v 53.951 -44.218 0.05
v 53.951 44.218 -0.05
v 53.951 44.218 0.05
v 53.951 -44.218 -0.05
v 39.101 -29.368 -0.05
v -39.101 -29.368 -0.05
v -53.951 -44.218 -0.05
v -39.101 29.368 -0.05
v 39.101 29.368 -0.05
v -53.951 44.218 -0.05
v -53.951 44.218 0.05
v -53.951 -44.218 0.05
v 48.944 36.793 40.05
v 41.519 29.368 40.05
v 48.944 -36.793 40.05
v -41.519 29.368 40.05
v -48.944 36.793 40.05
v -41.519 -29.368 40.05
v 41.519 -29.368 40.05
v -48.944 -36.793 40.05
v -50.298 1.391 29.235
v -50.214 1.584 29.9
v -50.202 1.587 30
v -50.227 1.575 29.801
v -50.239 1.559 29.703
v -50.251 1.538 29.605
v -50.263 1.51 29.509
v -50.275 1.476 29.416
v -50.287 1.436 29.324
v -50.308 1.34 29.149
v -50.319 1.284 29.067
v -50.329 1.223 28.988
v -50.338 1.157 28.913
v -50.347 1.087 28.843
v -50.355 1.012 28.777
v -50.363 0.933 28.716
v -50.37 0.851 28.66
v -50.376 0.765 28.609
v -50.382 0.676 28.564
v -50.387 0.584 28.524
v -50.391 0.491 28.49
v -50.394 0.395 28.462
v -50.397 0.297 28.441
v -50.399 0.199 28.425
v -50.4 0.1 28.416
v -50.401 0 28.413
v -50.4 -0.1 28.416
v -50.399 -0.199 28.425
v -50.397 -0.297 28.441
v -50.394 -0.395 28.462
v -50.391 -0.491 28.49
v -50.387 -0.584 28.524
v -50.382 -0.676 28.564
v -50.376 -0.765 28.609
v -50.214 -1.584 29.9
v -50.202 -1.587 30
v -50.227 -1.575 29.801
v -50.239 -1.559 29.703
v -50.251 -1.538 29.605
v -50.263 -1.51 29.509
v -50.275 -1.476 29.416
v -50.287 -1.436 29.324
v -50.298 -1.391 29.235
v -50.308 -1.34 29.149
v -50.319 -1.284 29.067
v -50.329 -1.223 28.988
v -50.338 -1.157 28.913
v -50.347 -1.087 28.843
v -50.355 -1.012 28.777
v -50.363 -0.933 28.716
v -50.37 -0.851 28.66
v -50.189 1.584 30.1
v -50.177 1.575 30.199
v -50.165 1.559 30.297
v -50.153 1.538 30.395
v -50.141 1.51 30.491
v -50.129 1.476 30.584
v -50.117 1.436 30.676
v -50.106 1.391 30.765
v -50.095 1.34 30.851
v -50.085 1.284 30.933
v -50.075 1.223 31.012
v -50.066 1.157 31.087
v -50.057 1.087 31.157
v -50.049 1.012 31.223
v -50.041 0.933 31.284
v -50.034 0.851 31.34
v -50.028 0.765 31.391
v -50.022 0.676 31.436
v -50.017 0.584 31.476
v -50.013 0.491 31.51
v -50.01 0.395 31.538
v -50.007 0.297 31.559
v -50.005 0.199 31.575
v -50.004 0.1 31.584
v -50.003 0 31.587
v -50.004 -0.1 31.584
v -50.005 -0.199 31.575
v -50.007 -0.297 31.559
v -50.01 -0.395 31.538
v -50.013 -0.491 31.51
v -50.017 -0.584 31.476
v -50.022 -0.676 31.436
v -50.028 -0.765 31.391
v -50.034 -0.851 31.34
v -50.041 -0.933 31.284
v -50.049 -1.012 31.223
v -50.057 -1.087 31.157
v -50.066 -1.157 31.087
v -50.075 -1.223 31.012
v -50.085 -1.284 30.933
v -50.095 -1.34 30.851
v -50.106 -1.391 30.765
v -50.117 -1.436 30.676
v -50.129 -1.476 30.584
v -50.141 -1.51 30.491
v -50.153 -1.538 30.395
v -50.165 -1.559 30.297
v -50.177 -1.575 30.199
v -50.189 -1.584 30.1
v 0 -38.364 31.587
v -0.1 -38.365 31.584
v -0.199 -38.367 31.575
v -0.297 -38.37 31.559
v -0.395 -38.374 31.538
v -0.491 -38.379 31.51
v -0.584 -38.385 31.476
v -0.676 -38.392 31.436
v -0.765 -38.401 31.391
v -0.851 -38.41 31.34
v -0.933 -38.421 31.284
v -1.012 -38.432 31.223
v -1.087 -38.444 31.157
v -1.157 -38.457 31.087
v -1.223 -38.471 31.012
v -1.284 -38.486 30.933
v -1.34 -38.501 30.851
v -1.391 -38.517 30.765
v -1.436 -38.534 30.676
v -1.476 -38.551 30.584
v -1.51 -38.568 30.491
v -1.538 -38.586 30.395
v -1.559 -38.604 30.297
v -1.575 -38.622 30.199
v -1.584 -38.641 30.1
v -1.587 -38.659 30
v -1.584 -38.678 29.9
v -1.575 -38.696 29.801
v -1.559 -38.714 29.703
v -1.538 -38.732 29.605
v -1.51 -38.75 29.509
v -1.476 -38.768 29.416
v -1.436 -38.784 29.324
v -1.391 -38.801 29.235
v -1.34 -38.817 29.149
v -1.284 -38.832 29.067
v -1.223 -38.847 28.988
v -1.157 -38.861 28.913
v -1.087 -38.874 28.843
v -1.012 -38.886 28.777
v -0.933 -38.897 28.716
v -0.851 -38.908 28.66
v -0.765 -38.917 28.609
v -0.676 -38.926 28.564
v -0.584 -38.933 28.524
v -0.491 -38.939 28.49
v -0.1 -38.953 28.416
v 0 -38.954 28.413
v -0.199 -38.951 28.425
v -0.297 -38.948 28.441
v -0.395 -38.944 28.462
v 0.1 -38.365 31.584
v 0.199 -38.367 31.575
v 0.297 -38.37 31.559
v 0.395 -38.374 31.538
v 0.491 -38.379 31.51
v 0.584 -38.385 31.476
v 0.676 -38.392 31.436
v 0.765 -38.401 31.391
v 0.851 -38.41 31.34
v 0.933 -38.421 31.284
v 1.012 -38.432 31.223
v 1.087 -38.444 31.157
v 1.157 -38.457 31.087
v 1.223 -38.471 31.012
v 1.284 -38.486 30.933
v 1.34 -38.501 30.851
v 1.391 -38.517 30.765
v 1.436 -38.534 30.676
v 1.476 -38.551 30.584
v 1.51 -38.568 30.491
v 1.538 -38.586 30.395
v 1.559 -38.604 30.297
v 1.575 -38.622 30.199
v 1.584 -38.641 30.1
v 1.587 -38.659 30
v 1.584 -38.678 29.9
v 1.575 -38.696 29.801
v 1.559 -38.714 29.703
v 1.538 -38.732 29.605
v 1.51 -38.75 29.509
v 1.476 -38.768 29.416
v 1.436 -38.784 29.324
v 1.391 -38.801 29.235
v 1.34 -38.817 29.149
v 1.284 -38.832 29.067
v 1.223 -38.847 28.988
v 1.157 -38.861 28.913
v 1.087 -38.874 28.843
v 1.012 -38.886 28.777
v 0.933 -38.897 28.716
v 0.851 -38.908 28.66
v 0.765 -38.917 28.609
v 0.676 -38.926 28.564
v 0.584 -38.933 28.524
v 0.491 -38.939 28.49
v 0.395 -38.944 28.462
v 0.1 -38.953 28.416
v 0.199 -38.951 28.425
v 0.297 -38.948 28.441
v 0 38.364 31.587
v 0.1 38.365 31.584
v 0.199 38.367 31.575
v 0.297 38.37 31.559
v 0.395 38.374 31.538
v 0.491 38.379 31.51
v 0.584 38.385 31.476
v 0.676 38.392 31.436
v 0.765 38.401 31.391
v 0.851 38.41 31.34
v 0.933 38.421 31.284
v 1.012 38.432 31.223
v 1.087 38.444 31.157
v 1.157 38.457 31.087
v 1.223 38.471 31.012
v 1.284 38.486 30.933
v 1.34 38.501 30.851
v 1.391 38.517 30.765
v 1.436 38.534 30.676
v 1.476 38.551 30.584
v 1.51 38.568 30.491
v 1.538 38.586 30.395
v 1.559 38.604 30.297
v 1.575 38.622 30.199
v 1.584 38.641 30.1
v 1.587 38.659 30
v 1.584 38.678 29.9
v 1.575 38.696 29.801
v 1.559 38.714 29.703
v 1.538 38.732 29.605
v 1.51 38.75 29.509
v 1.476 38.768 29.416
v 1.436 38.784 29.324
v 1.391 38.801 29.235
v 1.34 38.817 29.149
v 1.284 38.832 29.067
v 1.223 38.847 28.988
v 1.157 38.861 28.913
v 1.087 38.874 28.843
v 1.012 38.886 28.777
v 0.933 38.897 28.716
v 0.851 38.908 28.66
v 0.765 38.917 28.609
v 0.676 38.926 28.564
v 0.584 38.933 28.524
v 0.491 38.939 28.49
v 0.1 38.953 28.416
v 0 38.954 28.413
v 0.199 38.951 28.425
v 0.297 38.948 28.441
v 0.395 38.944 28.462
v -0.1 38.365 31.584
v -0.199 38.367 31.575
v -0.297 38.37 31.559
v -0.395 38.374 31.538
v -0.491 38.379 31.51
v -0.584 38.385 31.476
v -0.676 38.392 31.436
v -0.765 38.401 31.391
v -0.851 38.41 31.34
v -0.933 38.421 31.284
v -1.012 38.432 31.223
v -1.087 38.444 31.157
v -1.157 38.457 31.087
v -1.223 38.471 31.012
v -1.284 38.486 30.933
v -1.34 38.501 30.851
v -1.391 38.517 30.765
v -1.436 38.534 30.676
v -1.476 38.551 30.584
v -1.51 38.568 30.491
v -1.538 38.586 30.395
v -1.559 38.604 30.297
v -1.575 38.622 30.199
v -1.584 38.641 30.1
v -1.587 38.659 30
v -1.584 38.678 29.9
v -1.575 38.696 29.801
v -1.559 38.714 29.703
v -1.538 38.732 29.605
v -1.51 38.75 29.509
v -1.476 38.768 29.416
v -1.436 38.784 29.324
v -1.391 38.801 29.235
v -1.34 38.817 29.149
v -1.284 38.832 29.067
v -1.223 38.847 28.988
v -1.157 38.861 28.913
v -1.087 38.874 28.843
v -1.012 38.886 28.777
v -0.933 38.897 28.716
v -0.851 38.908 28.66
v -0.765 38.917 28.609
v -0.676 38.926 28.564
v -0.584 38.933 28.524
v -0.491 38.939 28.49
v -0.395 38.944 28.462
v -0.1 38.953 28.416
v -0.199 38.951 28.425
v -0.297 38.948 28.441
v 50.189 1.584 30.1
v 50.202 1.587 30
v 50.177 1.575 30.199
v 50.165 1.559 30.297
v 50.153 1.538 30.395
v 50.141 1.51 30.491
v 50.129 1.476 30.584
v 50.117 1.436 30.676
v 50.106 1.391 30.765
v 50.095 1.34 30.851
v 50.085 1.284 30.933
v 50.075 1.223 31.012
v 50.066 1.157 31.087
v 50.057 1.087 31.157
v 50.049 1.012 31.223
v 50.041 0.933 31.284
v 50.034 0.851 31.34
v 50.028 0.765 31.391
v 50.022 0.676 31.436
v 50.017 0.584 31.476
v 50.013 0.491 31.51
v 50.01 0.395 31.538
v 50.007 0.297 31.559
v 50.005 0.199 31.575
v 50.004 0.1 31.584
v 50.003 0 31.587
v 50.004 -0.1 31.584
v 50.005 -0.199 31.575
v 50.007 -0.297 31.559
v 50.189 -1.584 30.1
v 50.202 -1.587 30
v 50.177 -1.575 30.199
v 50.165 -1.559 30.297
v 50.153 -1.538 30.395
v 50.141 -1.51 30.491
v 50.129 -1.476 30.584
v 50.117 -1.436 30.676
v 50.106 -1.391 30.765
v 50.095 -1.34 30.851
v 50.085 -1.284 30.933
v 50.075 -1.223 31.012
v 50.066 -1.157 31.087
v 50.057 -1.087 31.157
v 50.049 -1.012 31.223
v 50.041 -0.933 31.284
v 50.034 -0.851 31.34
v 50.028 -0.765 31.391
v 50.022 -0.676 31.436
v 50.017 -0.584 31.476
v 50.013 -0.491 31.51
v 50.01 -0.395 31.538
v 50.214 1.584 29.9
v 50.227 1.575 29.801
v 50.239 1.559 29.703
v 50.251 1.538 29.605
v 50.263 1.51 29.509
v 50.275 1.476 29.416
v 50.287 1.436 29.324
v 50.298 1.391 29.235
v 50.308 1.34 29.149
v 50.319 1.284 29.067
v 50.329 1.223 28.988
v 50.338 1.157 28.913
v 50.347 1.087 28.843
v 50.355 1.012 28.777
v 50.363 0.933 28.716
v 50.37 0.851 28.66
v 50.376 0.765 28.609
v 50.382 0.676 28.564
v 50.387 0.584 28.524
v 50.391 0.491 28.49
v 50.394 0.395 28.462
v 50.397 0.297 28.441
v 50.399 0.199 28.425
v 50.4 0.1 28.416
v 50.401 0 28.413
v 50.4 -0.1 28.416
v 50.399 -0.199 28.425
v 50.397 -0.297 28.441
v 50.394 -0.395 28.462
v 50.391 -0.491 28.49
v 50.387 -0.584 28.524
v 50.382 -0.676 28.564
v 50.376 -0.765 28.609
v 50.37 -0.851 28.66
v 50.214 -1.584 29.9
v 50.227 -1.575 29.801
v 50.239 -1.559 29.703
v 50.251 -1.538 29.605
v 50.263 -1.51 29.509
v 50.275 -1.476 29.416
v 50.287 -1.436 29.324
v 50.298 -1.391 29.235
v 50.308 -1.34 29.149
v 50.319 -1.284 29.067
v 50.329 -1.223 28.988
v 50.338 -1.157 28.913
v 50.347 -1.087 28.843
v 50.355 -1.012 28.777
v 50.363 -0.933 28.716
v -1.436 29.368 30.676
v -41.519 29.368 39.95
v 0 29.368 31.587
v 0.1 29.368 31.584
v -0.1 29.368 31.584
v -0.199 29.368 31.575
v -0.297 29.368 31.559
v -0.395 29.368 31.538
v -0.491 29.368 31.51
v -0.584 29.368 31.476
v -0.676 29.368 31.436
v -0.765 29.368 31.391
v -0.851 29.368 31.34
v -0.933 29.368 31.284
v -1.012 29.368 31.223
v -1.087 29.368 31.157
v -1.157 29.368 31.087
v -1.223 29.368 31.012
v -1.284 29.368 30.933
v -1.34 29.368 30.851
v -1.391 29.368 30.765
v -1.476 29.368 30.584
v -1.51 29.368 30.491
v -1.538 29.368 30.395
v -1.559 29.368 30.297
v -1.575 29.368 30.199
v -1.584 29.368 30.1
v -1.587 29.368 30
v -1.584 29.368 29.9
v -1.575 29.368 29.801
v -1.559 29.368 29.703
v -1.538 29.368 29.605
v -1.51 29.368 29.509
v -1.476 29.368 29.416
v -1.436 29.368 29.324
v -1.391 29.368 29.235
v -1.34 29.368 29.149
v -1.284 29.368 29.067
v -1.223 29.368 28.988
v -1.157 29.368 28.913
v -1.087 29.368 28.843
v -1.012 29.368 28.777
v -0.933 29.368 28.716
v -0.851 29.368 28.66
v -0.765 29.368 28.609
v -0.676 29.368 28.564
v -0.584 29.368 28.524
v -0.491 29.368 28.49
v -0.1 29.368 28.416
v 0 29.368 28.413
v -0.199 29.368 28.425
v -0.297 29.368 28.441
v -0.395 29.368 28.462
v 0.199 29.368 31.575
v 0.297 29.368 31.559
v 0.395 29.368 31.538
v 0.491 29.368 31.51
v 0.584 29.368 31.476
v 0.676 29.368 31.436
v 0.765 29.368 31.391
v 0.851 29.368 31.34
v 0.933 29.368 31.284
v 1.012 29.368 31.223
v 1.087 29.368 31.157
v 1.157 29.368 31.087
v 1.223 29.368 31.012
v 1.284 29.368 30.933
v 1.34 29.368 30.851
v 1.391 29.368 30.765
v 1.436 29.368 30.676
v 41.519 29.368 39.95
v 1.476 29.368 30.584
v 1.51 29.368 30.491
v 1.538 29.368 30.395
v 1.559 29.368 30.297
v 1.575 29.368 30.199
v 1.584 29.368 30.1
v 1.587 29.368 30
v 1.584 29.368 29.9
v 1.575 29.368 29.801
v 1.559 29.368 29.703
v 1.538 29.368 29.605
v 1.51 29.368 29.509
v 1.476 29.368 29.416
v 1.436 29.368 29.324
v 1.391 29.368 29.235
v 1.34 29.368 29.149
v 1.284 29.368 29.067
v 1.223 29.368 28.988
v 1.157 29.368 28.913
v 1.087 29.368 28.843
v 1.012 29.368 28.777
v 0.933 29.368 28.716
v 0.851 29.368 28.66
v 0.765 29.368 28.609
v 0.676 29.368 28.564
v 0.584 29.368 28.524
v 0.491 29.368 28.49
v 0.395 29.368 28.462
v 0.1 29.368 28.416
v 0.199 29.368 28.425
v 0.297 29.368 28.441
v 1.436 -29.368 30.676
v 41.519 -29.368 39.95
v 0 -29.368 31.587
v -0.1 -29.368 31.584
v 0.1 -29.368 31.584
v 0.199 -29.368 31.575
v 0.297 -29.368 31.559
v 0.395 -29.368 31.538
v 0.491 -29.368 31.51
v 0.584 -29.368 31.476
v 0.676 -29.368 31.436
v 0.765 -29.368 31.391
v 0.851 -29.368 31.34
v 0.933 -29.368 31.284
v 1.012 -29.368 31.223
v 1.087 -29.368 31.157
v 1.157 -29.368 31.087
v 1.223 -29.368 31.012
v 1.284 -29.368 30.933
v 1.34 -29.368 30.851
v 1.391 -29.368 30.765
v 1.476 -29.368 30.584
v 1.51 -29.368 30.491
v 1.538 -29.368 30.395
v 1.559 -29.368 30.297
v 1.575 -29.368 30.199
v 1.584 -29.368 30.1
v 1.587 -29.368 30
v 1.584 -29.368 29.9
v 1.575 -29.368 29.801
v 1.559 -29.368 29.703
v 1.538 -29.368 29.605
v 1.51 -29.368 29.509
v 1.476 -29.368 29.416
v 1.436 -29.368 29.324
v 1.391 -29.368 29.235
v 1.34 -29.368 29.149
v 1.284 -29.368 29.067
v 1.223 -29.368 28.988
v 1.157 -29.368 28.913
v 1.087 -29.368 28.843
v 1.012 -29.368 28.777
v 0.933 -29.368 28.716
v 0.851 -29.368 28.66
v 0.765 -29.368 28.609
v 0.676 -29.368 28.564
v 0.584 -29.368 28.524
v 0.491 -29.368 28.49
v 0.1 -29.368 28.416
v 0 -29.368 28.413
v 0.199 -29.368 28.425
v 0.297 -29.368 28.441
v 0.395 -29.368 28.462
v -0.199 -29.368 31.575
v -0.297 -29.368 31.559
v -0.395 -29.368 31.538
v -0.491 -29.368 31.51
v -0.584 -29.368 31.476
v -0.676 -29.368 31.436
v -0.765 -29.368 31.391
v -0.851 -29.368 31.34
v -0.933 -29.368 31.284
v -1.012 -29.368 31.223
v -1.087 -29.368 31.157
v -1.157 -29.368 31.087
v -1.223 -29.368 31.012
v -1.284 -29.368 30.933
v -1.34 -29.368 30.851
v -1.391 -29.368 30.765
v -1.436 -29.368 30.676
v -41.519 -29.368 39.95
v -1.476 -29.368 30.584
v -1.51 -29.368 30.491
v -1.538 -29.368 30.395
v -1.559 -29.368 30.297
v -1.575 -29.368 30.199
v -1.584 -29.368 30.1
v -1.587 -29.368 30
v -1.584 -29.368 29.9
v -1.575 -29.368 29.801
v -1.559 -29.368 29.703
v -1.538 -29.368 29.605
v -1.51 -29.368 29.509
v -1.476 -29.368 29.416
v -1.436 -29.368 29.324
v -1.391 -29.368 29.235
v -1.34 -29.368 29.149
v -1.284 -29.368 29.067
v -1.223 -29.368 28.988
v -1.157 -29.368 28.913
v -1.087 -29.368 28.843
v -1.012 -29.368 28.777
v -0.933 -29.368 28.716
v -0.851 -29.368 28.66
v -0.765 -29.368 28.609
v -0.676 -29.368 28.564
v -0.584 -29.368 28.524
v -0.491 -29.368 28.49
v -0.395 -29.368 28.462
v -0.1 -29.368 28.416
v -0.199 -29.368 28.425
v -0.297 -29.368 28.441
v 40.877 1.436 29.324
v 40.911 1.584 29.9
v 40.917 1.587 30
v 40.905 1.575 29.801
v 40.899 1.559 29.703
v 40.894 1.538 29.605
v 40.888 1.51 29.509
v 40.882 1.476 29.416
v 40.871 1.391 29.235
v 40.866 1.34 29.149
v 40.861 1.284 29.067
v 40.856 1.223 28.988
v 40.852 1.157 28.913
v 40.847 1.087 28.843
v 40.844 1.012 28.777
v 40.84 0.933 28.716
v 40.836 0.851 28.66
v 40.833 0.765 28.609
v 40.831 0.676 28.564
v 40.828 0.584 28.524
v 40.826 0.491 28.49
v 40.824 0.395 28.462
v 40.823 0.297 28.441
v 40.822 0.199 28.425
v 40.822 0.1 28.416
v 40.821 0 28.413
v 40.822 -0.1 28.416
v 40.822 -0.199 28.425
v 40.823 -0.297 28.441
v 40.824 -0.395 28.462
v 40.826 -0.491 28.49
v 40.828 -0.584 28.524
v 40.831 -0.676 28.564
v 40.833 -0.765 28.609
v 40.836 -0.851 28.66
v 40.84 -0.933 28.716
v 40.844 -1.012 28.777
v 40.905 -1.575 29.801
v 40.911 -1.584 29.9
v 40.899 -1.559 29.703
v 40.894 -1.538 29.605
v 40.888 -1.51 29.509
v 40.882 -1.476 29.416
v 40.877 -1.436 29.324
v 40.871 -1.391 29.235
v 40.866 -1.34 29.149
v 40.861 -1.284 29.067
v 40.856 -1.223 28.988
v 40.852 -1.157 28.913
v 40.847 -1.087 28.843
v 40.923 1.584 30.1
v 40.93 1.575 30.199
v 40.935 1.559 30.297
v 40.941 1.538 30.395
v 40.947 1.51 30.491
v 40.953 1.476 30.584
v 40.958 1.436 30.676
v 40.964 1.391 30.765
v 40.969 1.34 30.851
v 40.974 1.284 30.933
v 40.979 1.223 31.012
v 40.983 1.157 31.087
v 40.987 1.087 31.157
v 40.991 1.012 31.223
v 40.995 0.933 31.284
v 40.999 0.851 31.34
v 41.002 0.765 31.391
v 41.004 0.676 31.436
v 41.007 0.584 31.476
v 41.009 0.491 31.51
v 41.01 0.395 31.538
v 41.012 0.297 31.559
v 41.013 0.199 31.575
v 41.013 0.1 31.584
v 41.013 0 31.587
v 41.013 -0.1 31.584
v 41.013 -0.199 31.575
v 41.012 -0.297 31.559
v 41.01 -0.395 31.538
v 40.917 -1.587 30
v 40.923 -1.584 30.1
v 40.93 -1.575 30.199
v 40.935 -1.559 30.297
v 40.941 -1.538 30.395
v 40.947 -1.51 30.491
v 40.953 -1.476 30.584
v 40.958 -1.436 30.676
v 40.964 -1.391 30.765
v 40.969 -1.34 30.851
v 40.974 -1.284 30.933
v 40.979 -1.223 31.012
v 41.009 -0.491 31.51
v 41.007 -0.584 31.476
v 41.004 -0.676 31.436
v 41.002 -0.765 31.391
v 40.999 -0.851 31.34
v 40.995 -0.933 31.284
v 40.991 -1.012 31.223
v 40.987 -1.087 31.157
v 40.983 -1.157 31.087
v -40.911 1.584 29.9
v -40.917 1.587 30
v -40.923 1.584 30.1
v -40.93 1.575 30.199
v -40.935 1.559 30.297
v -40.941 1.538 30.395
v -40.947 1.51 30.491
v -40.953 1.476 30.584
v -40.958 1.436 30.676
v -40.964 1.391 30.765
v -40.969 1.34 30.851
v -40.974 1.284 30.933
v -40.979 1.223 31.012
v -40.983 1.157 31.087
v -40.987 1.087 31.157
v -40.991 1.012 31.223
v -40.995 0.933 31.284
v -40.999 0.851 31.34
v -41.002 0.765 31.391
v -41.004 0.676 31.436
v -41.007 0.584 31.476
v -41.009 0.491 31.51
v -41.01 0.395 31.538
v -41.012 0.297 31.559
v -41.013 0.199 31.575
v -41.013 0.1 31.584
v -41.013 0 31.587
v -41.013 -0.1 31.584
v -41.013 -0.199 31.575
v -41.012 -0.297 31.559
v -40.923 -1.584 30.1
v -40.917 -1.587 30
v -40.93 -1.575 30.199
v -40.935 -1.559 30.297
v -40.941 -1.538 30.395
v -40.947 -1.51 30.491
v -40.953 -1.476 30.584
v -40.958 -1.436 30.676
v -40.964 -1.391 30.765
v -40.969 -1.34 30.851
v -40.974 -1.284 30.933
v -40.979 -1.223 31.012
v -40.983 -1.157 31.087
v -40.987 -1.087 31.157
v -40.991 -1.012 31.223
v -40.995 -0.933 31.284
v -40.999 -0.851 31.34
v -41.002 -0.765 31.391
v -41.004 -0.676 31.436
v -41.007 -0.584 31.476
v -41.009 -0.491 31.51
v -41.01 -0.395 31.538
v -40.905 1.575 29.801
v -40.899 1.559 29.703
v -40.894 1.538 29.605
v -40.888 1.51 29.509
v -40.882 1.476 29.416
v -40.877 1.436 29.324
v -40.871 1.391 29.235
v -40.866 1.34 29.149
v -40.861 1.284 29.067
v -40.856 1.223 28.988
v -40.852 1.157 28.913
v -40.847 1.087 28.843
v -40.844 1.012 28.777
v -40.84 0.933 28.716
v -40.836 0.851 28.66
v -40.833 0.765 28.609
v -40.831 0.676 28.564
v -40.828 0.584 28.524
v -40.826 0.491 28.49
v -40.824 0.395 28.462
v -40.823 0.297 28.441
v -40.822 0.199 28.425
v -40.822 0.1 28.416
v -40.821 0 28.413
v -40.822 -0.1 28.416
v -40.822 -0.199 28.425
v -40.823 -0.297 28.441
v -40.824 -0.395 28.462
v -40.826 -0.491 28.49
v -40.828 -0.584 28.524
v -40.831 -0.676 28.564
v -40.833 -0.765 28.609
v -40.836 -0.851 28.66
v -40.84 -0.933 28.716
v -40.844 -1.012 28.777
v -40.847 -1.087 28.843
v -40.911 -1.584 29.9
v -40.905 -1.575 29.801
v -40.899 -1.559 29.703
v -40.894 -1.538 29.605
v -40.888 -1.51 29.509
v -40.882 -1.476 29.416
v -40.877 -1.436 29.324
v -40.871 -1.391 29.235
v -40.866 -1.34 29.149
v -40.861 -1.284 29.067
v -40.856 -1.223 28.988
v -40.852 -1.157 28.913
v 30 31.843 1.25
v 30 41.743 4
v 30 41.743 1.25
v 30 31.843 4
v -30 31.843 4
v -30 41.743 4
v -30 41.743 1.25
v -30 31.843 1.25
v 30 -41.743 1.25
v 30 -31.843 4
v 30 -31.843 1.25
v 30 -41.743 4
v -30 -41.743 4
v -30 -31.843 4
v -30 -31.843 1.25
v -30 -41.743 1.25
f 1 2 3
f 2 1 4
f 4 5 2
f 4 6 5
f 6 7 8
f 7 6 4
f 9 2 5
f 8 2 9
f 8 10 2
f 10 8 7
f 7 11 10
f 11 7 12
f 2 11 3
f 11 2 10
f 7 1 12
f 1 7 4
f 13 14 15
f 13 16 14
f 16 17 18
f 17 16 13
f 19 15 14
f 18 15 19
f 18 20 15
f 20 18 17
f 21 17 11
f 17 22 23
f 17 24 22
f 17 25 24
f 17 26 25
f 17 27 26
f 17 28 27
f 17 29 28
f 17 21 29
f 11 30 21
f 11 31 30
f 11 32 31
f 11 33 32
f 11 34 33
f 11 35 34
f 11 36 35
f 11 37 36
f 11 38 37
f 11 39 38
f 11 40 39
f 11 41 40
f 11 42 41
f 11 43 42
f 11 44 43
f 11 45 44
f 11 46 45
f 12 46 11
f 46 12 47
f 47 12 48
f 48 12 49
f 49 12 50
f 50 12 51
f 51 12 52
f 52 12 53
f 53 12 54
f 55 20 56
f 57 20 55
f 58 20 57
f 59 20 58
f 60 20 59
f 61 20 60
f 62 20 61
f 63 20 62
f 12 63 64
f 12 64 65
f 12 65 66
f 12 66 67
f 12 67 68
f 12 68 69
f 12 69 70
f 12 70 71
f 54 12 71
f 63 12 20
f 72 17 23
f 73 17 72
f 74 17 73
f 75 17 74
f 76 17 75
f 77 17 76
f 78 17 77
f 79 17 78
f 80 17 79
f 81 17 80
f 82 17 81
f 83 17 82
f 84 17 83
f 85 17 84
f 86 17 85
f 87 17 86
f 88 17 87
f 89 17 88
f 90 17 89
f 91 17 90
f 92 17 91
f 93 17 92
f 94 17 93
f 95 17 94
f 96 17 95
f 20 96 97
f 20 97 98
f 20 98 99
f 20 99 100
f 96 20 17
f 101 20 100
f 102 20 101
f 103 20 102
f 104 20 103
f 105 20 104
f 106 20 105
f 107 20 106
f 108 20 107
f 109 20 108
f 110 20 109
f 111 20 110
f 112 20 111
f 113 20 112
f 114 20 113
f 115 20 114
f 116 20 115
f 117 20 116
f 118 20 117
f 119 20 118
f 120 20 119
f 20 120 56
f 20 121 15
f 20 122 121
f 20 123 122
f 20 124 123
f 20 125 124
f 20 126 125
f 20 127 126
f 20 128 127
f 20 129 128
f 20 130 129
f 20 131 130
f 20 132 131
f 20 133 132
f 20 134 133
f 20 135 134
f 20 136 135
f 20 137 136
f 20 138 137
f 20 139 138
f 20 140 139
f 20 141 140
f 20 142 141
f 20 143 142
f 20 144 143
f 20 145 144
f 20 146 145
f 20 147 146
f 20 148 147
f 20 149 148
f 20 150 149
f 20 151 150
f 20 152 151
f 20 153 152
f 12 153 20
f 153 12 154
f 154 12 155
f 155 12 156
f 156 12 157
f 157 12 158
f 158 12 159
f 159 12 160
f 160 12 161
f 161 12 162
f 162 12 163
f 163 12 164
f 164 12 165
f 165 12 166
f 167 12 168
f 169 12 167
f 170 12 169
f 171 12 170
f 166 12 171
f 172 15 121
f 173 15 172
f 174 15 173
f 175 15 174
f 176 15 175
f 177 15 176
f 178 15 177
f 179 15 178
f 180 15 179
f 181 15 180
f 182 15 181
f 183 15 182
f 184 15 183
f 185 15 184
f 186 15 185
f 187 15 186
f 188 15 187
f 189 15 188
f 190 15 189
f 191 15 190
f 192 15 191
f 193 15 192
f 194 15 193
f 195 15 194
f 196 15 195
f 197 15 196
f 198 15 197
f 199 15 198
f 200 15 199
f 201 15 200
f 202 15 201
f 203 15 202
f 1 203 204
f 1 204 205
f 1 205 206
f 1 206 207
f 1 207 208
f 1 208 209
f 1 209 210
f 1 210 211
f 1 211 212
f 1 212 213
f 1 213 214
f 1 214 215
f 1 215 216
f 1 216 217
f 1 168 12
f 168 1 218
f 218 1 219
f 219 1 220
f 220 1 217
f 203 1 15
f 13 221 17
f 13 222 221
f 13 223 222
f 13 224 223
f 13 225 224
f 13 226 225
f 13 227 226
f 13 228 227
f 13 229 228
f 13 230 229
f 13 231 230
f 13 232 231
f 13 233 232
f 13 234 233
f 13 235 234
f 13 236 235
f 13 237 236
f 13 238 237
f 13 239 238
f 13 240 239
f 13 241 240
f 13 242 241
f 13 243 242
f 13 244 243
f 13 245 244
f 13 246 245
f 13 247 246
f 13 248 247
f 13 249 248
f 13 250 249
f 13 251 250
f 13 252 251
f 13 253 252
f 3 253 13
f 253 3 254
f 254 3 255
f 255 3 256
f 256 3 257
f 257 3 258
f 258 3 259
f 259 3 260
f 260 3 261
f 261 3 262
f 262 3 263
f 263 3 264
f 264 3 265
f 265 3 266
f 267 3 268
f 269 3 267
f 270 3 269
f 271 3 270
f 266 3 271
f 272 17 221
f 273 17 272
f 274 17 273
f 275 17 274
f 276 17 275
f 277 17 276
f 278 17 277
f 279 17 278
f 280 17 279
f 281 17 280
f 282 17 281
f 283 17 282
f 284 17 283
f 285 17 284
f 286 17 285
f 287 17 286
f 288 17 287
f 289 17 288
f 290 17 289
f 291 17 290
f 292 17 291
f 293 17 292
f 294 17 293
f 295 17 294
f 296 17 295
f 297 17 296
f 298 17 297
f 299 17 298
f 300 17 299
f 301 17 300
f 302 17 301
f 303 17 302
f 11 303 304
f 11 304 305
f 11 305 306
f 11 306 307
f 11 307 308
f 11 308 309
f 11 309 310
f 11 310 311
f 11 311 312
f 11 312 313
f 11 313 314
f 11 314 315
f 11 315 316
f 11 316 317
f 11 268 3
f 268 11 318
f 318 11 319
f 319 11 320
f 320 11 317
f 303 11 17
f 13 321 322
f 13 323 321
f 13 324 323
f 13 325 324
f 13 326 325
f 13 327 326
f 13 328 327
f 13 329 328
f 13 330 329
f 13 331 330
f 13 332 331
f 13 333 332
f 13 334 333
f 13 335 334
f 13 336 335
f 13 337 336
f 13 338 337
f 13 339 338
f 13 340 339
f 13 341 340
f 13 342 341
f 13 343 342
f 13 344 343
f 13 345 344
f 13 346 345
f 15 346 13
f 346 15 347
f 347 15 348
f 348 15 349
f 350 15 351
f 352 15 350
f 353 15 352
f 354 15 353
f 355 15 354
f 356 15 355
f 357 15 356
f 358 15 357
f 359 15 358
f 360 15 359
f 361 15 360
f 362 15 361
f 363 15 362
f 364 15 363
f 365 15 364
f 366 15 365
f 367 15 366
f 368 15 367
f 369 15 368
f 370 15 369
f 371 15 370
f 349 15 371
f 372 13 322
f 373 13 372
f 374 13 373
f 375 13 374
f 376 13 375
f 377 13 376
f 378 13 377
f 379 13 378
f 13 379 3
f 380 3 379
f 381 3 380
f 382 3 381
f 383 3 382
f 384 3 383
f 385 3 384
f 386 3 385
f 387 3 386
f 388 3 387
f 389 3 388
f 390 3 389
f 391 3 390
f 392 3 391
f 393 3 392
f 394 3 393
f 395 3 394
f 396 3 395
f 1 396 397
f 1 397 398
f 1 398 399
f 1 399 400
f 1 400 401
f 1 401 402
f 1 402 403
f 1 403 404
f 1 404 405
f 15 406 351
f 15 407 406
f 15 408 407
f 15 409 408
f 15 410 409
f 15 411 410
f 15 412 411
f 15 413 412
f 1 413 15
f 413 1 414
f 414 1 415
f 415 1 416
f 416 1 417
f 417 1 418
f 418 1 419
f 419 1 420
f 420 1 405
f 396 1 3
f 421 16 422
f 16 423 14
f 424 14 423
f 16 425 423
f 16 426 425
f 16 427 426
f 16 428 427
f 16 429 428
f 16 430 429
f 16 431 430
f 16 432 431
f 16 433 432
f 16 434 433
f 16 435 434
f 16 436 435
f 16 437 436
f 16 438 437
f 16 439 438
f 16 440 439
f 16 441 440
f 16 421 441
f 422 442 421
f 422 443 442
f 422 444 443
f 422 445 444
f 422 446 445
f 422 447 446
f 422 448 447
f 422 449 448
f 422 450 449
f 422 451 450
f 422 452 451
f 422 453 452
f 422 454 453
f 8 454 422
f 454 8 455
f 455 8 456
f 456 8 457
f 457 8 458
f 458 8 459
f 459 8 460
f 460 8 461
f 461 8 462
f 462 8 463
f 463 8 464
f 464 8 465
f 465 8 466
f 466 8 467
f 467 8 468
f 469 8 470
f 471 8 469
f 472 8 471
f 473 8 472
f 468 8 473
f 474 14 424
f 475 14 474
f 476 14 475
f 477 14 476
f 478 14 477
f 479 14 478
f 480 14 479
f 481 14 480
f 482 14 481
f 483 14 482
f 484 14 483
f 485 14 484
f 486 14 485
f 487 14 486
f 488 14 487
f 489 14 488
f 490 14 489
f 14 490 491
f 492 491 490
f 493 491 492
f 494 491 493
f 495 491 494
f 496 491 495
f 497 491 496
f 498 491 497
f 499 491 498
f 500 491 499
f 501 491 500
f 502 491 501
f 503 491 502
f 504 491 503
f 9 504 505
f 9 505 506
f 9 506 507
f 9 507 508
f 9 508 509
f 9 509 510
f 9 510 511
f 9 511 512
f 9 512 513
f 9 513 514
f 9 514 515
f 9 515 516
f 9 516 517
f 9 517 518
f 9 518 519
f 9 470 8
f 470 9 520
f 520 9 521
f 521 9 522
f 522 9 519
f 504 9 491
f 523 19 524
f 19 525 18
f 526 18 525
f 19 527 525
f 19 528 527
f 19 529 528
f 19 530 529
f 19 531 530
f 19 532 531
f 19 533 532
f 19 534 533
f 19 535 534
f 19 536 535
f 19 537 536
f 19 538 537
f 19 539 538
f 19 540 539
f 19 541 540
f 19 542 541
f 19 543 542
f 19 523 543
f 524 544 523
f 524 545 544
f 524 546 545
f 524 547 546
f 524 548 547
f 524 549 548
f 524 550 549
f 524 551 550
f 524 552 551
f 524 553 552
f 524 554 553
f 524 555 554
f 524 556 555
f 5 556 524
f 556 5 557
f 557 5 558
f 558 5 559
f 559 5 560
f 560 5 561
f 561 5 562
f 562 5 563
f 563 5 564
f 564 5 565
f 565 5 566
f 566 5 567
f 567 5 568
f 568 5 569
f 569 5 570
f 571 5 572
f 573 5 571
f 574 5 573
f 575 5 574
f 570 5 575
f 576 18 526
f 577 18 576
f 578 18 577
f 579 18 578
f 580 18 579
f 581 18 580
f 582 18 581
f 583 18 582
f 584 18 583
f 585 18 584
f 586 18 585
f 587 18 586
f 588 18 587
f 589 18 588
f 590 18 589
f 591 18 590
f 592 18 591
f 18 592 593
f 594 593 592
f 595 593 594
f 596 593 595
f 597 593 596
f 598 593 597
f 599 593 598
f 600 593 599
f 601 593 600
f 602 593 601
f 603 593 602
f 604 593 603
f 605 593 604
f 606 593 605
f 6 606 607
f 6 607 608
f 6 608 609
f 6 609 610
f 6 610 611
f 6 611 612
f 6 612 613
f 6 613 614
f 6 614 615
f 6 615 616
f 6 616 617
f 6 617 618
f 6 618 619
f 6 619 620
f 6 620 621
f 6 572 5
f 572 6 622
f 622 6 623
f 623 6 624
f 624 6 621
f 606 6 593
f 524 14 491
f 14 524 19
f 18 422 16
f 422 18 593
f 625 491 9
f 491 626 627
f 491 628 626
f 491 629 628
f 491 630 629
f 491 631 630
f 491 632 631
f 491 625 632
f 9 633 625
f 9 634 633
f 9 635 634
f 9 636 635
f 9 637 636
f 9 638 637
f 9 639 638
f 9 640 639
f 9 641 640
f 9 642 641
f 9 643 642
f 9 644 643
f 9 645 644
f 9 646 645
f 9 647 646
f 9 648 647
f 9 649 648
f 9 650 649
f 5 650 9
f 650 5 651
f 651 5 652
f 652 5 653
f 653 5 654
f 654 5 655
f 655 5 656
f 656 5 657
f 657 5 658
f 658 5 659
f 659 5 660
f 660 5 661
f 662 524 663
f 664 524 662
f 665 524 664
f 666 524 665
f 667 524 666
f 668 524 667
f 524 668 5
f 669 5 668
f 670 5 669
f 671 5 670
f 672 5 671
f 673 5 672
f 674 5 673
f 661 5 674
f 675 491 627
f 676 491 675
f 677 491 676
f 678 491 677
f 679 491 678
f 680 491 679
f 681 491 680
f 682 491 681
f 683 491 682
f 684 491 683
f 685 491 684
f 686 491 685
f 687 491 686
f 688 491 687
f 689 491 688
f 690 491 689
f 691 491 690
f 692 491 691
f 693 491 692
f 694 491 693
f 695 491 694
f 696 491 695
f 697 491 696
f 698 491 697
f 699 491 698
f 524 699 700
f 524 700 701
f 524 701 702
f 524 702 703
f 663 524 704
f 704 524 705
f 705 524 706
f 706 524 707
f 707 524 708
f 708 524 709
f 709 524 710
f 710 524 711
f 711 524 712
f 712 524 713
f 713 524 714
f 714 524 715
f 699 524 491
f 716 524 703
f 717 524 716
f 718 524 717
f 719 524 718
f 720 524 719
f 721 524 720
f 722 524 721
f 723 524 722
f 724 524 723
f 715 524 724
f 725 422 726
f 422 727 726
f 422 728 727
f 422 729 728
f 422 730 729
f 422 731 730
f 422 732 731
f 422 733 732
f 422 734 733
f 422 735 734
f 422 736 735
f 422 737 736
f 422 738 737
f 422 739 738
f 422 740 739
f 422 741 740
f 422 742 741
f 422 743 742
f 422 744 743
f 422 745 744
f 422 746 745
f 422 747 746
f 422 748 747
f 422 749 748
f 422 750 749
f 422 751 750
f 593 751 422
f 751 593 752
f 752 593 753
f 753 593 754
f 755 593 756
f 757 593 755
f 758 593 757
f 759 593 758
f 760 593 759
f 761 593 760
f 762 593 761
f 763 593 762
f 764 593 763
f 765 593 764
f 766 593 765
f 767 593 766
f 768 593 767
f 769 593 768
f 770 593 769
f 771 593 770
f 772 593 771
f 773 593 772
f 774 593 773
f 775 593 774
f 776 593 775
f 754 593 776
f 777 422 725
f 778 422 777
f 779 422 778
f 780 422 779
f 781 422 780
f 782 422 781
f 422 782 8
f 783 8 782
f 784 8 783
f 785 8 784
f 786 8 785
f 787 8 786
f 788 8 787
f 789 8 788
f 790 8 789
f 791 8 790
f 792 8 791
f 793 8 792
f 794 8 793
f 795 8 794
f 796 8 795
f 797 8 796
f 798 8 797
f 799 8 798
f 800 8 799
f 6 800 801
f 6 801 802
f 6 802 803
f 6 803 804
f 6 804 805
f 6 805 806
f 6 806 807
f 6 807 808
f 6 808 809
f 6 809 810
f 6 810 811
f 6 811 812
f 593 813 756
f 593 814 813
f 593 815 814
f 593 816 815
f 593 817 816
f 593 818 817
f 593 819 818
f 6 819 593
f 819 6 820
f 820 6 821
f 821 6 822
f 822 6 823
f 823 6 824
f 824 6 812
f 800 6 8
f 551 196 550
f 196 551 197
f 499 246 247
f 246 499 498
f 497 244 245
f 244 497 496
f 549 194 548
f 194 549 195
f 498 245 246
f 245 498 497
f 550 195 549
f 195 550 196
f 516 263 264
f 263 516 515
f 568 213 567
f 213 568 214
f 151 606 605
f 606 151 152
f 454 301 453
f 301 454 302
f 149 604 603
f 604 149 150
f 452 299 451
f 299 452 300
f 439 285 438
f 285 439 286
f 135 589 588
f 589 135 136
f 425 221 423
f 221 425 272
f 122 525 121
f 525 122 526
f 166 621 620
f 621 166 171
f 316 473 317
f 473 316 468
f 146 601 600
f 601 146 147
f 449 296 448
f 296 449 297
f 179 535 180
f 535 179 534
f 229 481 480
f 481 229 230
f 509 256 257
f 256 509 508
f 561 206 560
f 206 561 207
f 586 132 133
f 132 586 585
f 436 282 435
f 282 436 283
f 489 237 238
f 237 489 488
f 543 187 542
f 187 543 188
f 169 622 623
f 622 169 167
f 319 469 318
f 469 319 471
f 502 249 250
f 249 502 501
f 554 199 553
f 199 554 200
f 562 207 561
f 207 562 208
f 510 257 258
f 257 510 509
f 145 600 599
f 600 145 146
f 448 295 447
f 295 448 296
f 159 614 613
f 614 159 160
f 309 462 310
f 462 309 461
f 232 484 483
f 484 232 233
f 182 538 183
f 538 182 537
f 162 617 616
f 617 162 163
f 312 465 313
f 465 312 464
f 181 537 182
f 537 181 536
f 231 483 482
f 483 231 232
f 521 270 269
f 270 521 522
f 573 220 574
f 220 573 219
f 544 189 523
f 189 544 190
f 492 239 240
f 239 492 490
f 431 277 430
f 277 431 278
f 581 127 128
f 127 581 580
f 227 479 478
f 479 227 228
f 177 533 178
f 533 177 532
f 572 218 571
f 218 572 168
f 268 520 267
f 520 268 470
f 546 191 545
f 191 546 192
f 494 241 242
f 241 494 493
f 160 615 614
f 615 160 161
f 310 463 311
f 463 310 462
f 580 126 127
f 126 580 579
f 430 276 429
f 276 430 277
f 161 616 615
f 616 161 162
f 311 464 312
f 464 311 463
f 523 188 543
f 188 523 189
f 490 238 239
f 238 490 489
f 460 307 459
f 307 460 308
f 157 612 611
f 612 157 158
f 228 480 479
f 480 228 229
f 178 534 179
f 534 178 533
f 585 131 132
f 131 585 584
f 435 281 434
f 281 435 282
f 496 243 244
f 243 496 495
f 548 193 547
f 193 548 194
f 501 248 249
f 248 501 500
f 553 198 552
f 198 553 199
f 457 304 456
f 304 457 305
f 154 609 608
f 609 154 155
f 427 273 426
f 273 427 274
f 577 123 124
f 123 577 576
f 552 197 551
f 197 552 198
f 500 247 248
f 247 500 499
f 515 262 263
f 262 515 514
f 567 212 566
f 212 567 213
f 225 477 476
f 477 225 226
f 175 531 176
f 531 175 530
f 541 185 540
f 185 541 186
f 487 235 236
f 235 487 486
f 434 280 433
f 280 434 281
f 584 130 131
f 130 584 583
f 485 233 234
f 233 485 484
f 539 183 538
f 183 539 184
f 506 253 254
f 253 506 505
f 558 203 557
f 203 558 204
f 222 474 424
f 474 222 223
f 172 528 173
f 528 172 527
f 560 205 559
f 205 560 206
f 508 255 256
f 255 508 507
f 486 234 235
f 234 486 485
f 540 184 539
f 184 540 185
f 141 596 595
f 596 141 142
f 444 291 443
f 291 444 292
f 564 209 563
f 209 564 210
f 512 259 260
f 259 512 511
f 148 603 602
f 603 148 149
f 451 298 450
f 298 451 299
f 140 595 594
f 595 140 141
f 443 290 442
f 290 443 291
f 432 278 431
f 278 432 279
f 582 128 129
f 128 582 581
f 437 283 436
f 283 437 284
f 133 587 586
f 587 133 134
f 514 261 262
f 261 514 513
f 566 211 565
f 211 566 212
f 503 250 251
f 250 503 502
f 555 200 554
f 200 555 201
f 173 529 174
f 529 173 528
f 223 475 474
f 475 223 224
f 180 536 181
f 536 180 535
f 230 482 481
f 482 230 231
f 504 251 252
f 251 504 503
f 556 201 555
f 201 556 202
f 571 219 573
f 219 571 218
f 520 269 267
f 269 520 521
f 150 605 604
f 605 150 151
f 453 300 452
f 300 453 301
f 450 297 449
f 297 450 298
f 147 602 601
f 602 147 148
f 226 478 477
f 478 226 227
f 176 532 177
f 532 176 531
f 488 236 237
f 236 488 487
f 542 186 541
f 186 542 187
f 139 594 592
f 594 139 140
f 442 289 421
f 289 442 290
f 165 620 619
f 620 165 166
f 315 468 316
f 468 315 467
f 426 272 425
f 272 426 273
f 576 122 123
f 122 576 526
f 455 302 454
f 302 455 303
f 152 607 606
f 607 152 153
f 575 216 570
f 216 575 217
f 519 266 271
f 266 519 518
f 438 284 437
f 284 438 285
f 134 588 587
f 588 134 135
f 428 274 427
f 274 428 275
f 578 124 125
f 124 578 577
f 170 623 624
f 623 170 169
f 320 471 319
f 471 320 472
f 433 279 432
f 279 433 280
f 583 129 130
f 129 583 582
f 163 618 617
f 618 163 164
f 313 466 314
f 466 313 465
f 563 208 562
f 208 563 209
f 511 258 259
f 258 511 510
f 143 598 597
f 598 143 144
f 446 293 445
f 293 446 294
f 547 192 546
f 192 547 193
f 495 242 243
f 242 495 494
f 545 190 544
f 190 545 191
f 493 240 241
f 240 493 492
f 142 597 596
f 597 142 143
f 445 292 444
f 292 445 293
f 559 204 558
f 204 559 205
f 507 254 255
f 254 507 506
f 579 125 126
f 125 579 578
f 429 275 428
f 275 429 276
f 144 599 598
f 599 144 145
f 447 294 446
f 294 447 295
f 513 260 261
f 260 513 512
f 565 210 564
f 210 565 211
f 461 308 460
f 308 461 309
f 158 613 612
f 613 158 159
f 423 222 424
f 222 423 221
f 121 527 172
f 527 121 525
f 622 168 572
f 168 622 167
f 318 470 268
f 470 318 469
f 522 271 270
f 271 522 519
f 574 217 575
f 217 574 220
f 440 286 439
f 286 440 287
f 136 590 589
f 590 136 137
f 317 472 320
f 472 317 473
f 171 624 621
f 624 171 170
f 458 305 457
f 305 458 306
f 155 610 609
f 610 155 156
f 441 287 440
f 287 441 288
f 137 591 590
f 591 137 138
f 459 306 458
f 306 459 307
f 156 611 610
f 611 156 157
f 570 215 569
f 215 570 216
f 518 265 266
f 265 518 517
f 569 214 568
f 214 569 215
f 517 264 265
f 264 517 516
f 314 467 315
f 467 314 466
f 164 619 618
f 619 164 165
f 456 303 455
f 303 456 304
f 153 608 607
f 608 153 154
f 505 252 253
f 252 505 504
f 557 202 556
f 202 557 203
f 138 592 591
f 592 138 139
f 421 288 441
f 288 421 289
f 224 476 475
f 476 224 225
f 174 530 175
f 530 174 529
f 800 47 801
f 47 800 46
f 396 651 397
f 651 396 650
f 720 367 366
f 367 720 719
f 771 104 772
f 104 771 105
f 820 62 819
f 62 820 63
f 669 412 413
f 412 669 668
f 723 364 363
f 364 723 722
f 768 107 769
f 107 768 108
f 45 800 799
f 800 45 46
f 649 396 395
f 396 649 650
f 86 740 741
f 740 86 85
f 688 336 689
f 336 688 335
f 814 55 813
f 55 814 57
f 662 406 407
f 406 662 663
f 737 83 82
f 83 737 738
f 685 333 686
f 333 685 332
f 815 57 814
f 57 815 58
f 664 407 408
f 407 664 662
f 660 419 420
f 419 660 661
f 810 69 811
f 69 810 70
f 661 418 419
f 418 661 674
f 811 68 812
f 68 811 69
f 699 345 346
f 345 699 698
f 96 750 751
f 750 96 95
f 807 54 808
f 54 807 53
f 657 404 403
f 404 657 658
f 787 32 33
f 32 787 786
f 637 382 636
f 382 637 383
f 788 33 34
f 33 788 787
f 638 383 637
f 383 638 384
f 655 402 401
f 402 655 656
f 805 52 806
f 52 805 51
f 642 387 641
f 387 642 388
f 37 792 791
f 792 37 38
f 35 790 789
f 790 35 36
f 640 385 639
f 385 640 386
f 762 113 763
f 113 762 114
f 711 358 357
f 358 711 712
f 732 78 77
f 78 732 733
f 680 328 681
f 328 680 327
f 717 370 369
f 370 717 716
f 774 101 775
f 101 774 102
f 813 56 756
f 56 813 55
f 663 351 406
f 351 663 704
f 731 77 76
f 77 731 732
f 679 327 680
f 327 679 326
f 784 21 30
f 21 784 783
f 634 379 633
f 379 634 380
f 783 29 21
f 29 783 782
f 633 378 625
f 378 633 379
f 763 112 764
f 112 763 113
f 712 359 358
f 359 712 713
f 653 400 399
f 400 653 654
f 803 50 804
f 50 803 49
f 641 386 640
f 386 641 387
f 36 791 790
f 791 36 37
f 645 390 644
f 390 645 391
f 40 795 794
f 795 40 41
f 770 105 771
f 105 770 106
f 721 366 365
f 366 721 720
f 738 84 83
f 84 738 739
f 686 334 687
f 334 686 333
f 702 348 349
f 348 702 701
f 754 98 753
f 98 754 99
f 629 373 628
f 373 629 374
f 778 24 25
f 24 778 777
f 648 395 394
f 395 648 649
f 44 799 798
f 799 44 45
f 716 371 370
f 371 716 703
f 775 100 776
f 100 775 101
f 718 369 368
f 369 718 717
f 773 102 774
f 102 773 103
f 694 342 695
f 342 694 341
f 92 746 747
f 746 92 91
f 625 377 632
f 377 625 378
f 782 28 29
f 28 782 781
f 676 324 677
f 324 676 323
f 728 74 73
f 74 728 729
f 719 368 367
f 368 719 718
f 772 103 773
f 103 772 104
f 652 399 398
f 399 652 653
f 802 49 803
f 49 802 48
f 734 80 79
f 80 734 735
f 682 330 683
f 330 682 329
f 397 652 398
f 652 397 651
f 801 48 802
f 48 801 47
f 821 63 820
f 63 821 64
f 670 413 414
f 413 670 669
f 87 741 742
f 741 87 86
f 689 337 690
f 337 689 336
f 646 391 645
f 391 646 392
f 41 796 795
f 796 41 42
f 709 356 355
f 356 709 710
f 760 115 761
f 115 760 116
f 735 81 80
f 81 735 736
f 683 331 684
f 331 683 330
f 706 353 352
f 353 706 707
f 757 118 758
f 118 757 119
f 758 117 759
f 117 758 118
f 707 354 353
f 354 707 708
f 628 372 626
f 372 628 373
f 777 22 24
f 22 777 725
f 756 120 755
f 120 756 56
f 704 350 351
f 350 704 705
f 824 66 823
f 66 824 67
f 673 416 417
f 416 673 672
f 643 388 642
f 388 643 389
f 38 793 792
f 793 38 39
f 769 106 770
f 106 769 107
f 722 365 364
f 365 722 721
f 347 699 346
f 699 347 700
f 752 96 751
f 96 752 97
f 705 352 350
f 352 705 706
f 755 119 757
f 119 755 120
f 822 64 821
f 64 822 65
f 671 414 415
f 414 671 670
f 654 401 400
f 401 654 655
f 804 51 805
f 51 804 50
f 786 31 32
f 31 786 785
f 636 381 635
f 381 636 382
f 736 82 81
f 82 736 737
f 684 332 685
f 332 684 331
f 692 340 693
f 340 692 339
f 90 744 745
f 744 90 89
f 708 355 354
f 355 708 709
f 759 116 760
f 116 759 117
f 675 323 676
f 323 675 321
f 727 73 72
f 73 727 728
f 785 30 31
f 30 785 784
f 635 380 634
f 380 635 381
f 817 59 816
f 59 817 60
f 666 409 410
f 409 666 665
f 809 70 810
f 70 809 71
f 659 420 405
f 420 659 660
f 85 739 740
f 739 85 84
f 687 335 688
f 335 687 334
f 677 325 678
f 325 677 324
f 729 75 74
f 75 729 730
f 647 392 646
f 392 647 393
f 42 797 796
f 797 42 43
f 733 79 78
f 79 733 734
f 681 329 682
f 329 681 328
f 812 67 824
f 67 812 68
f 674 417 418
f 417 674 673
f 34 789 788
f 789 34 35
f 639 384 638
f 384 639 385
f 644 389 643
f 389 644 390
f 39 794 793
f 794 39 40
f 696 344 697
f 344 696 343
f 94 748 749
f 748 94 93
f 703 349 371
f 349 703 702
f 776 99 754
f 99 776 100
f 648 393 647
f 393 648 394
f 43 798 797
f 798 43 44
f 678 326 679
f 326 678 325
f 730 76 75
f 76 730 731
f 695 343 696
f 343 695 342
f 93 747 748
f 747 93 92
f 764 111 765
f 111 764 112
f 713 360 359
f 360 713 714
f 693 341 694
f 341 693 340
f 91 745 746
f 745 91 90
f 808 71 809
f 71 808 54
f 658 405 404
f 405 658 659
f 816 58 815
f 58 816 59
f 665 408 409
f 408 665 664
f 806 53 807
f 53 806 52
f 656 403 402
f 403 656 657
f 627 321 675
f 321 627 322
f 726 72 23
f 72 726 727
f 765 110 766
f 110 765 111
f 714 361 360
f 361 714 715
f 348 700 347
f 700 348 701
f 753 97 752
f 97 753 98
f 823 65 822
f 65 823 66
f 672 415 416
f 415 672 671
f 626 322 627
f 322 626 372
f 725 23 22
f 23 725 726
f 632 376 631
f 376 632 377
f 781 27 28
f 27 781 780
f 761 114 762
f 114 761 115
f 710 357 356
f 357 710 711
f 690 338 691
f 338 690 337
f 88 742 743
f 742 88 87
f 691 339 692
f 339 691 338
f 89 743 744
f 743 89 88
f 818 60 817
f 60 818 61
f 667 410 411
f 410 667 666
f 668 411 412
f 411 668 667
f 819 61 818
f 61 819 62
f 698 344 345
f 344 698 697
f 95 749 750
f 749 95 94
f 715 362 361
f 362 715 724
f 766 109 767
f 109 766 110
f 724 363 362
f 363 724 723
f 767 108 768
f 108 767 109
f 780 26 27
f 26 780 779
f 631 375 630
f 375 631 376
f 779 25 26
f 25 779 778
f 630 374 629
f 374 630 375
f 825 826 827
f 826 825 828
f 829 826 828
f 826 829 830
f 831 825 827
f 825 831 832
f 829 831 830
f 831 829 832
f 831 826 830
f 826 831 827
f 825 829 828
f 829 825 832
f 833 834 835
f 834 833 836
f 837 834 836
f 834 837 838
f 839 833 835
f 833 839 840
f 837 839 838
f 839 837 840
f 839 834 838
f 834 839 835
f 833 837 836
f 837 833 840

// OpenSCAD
$fn=100;

MM=25.4;
PCT = 3;

magnet= [60, 9.9, 2.75];

vertical_height = 40;


//midpoint of pipe. Should have the correct value 
target_vertical_x = 3.174 * MM;
target_vertical_y = 2.384 * MM;

vertical_bottom_x = target_vertical_x * ((100 - PCT)/100);
vertical_bottom_y = target_vertical_y * ((100 - PCT)/100);

vertical_top_x = target_vertical_x * (1 + PCT/100);
vertical_top_y = target_vertical_y * (1 + PCT/100);


echo ("x =", vertical_top_x, " < ", target_vertical_x, " < ", vertical_bottom_x);  
echo ("y =", vertical_top_y, " < ", target_vertical_y, " < ", vertical_bottom_y);  


module tapered_rectangle(fat = 0, bottom_tweak =1, top_tweak = 1)
{
    color("RED",.5)
    cube([ vertical_bottom_x + fat * bottom_tweak, vertical_bottom_y + fat * bottom_tweak, .1], true);

    
    //color("PINK")
    //translate([0, 0, vertical_height/2])
    //cube([ target_vertical_x + fat, target_vertical_y + fat, .1], true);

    
    color("GREEN")
    translate([0, 0, vertical_height])
    cube([ vertical_top_x + fat * top_tweak, vertical_bottom_y + fat * top_tweak, .1], true);


    color("YELLOW", .1)
    hull()
    {
        cube([ vertical_bottom_x + fat * bottom_tweak, vertical_bottom_y + fat * bottom_tweak, .1], true);
        translate([0, 0, vertical_height])
        cube([ vertical_top_x + fat * top_tweak, vertical_bottom_y + fat * top_tweak, .1], true);
    }
}

BURY = 1.25;
DRILL = 1/8 * MM;

difference()
{
    // top is thinner, no magnet
    tapered_rectangle(magnet.y * 3, top_tweak = .5);  // top is thin
    tapered_rectangle(bottom_tweak = 1.1);            // bottom is fat (magnet)

    translate([0, vertical_bottom_y/2 + magnet.y * 3/4 , 
                magnet.z/2 + BURY])
    #cube (magnet, true);

    translate([0, -(vertical_bottom_y/2 + magnet.y * 3/4) , 
        magnet.z/2 + BURY])
    #cube (magnet, true);

    // drill holes
    translate([ 0, 0, vertical_height * 3/4])
    {
        rotate([ 90, 0, 0])
        cylinder(h = 100, d= DRILL, center = true);
        rotate([ 0, 90, 0])
        cylinder(h = 150, d= DRILL, center = true);
    }
    
}
